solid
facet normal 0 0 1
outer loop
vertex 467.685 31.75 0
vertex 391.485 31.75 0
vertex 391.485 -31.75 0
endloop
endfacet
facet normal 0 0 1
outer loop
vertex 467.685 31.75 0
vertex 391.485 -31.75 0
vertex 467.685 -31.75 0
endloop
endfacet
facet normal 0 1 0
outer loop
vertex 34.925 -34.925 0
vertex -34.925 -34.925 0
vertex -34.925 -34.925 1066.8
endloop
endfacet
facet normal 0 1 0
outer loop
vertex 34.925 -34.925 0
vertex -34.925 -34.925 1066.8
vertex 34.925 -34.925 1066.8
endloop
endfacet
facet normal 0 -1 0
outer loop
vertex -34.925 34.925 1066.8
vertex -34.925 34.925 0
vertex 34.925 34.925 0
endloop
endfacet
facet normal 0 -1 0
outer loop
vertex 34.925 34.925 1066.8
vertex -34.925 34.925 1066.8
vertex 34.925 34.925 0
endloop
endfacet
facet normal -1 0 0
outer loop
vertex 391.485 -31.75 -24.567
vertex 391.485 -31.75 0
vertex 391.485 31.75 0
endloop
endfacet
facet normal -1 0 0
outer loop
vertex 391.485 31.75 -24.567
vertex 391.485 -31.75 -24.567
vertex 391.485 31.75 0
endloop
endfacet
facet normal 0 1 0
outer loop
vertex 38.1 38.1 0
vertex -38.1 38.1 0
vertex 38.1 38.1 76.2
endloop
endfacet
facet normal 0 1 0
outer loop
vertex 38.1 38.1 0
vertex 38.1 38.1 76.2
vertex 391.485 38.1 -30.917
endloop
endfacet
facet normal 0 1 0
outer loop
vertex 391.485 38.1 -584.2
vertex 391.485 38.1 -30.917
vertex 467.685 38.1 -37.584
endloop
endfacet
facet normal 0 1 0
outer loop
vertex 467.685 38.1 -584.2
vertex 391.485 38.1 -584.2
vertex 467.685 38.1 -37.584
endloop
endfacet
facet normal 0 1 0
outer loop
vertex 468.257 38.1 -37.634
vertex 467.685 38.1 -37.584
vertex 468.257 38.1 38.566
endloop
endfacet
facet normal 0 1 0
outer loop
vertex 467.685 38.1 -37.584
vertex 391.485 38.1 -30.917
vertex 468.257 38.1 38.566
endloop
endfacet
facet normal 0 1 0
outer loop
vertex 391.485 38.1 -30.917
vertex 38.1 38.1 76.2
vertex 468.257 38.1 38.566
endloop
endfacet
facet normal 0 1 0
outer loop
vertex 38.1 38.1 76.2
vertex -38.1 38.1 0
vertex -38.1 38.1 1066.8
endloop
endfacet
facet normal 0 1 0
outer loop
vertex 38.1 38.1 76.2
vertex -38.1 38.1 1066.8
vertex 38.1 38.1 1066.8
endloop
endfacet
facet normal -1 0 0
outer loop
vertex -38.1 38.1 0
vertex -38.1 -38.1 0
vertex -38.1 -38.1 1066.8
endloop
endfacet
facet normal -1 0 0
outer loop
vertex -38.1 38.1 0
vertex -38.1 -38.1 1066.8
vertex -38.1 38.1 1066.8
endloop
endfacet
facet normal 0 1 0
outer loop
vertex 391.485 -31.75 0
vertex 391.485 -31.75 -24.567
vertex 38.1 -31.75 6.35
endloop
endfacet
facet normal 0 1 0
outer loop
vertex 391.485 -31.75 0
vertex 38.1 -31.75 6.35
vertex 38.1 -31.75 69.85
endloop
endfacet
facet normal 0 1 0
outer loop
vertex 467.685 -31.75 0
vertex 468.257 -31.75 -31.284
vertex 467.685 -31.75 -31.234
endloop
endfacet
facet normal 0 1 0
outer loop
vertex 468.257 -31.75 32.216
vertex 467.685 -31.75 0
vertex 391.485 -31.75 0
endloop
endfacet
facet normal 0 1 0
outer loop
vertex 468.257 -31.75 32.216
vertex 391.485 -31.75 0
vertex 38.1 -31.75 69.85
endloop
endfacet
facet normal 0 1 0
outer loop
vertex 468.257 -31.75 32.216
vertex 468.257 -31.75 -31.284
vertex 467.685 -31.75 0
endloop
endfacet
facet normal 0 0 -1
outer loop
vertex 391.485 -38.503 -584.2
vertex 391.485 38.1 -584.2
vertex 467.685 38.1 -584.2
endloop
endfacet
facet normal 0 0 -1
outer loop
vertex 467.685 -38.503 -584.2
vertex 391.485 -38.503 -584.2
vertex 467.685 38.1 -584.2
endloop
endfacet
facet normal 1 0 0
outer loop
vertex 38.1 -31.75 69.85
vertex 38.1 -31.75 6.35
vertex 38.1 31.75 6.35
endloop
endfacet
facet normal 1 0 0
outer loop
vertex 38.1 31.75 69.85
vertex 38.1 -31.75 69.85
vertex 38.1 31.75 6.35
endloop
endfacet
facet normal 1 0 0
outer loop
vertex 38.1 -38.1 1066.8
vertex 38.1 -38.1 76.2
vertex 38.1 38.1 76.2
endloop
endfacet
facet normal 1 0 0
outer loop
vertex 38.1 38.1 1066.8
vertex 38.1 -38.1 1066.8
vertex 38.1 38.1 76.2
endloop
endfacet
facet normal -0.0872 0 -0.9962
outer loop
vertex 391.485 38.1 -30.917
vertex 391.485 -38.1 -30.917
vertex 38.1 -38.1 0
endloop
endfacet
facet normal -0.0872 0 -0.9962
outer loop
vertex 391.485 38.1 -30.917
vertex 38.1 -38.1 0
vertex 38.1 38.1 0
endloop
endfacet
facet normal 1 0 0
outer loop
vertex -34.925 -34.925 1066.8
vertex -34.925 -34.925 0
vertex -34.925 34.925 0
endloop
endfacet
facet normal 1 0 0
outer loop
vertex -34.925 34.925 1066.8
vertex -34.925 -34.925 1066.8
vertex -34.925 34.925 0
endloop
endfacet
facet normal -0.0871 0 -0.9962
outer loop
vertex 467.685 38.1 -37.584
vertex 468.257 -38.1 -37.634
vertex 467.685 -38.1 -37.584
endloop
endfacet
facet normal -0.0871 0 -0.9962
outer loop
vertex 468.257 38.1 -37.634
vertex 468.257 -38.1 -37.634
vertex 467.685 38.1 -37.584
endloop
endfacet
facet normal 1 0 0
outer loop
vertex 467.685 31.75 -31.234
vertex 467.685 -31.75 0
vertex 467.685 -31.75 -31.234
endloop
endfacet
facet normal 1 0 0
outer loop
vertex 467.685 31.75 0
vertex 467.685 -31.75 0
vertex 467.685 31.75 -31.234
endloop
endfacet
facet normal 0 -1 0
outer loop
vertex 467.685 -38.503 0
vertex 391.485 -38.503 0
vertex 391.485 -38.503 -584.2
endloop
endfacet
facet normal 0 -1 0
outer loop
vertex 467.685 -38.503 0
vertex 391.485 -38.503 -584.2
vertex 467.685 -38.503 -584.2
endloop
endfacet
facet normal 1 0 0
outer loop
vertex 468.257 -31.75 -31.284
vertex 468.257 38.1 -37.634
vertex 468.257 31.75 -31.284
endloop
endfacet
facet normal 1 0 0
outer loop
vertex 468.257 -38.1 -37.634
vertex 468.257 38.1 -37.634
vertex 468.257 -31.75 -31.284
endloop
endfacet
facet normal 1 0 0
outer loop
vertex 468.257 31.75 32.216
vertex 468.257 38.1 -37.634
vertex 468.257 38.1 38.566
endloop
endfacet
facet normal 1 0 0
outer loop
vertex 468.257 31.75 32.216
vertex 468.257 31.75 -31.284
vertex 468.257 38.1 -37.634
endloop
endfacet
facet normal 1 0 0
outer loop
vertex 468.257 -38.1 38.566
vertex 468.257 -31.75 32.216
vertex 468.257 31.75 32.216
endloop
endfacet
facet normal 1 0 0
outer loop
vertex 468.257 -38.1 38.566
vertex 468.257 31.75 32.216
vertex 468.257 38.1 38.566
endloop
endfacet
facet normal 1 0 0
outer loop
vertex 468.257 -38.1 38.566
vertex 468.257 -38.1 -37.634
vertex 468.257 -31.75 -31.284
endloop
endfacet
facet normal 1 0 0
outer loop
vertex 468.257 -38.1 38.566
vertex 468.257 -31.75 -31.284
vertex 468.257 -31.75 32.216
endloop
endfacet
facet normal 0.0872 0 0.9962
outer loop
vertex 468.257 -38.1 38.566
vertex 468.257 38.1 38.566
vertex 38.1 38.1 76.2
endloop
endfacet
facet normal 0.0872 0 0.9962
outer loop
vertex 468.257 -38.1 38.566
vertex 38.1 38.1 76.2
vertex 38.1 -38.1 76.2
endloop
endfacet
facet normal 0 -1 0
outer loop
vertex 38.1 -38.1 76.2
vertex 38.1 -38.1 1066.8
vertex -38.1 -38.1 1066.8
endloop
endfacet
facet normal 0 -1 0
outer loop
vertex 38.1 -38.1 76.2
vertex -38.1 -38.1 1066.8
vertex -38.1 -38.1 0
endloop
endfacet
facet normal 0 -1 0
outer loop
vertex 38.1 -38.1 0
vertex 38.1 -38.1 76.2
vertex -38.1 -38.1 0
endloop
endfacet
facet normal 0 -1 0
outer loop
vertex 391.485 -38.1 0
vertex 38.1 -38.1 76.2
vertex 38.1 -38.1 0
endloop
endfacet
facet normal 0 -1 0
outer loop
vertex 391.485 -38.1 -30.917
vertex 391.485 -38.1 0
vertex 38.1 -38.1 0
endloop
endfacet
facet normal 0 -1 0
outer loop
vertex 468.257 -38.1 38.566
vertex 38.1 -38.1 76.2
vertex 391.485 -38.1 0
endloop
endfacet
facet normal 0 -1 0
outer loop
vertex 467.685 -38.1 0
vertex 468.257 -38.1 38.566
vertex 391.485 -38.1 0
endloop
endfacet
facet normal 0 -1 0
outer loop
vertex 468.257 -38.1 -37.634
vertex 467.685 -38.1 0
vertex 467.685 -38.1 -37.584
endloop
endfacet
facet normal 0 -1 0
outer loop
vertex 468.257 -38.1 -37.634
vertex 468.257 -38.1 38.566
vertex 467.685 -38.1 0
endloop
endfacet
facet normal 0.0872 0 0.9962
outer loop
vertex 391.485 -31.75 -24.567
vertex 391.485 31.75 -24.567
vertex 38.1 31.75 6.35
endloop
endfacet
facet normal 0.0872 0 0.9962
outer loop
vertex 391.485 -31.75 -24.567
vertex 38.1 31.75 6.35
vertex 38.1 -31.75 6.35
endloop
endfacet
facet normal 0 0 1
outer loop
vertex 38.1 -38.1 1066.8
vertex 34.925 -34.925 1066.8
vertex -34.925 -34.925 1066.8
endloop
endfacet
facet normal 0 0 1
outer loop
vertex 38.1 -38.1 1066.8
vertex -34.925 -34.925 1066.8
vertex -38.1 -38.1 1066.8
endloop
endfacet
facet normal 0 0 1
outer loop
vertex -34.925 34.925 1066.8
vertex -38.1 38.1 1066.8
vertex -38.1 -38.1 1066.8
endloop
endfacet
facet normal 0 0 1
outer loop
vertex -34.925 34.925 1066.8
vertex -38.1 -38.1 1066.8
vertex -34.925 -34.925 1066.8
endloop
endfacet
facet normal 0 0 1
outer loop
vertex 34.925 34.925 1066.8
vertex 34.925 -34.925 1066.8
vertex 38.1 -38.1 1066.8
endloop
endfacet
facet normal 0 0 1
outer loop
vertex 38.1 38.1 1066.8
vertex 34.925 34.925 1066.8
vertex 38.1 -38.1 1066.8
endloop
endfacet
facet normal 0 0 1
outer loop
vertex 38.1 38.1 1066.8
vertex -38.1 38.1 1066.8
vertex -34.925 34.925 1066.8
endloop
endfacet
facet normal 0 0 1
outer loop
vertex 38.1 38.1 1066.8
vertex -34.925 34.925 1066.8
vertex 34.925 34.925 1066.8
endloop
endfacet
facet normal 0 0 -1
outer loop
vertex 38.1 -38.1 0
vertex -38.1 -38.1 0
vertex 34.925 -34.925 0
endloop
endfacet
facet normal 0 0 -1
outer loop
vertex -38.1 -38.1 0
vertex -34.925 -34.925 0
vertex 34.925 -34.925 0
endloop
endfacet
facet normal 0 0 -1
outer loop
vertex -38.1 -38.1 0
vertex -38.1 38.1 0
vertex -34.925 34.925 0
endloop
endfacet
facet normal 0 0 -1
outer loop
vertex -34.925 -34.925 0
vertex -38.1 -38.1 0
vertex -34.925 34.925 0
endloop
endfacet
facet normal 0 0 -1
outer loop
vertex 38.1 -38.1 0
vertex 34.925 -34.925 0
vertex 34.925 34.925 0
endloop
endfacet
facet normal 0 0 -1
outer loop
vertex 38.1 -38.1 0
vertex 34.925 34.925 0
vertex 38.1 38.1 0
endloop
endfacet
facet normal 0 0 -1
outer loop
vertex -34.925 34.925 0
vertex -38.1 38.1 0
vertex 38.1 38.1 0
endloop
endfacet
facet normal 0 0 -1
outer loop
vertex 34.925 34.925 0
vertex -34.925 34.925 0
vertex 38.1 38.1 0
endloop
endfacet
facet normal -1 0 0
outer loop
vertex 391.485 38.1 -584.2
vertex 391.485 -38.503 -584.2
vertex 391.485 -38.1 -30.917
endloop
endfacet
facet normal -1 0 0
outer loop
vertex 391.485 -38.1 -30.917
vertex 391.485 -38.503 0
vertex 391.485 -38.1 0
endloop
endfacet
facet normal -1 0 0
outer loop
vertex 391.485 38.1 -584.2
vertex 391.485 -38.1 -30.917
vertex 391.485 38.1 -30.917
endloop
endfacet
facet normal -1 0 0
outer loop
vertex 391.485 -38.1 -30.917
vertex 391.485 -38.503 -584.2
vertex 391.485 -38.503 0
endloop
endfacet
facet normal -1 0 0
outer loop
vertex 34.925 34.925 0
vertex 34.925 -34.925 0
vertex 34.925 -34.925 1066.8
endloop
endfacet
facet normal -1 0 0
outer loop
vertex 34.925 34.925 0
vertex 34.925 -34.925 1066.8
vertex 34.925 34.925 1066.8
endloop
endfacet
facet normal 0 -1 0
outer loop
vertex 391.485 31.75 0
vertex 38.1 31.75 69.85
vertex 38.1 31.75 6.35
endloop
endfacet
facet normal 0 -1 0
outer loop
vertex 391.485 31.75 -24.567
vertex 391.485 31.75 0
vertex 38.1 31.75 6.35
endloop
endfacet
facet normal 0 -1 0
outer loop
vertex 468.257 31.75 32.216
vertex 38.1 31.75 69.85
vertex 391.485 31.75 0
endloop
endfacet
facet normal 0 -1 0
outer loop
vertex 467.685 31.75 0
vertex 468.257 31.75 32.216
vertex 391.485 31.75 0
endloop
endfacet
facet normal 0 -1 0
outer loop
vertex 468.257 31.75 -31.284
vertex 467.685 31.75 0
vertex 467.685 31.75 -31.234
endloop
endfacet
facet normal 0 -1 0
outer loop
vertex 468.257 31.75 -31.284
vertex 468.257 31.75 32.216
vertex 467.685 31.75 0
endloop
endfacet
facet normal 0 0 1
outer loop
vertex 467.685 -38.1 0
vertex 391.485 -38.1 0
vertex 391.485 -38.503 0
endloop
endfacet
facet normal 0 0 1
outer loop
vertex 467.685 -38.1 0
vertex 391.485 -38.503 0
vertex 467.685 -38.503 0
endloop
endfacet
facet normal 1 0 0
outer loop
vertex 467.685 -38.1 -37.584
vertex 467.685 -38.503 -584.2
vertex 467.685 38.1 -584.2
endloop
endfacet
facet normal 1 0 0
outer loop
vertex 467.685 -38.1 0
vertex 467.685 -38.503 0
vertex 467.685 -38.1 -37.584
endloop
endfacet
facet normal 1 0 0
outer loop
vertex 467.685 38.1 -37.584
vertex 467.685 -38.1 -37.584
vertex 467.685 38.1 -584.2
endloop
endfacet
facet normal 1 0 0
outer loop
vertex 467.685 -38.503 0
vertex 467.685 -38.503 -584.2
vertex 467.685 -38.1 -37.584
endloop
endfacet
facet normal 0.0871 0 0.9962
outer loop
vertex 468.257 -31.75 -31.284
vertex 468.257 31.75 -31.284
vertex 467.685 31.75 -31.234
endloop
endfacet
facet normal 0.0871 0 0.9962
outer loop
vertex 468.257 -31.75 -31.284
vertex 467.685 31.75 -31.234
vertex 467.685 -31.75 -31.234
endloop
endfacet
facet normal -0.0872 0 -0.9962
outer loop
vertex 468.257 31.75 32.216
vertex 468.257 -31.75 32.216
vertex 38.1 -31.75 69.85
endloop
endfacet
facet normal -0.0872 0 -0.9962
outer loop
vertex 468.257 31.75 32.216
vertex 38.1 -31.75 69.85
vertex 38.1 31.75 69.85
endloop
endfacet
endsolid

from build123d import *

# Parameters (mm, degrees)
F0_W     = 3.175
F0_H     = 76.2
F0_W_2   = 69.85
F1_DEPTH = 1066.8
F5_W     = 69.85
F5_H     = 69.85
F6_DEPTH = 1066.801
F7_W     = 76.2
F7_H     = 76.6029041231
F8_DEPTH = 584.2


with BuildPart() as f1:
    # F0 (on Top) → F1 (new body)
    with BuildSketch(Plane.XY):
        with Locations((-36.5125, 0)):
            Rectangle(F0_W, F0_H)
        Rectangle(F0_W_2, F0_H)
        with Locations((36.5125, 0)):
            Rectangle(F0_W, F0_H)
    extrude(amount=F1_DEPTH)

    # F4: sweep along a path in F3
    with BuildLine(Plane.XZ) as f4_path:
        Line((38.2661430364, 38.2113192024), (468.4230136724, 0.577469484))
    # F2 (on face) → F4 (sweep)
    with BuildSketch(Plane.YZ.offset(38.1)):
        Polygon((-38.1, 0), (0, 0), (38.1, 0), (38.1, 76.2), (-38.1, 76.2), align=None)
        Polygon((31.75, 6.35), (0, 6.35), (-31.75, 6.35), (-31.75, 69.85), (31.75, 69.85), align=None, mode=Mode.SUBTRACT)
    sweep(path=f4_path.line)

    # F5 (on Top) → F6 (cut, through all)
    with BuildSketch(Plane.XY):
        Rectangle(F5_W, F5_H)
    extrude(amount=F6_DEPTH, mode=Mode.SUBTRACT)

    # F7 (on Top) → F8 (join)
    with BuildSketch(Plane.XY):
        with Locations((429.5848959012, -0.2014520615)):
            Rectangle(F7_W, F7_H)
    extrude(amount=-F8_DEPTH)


solid = f1.part
